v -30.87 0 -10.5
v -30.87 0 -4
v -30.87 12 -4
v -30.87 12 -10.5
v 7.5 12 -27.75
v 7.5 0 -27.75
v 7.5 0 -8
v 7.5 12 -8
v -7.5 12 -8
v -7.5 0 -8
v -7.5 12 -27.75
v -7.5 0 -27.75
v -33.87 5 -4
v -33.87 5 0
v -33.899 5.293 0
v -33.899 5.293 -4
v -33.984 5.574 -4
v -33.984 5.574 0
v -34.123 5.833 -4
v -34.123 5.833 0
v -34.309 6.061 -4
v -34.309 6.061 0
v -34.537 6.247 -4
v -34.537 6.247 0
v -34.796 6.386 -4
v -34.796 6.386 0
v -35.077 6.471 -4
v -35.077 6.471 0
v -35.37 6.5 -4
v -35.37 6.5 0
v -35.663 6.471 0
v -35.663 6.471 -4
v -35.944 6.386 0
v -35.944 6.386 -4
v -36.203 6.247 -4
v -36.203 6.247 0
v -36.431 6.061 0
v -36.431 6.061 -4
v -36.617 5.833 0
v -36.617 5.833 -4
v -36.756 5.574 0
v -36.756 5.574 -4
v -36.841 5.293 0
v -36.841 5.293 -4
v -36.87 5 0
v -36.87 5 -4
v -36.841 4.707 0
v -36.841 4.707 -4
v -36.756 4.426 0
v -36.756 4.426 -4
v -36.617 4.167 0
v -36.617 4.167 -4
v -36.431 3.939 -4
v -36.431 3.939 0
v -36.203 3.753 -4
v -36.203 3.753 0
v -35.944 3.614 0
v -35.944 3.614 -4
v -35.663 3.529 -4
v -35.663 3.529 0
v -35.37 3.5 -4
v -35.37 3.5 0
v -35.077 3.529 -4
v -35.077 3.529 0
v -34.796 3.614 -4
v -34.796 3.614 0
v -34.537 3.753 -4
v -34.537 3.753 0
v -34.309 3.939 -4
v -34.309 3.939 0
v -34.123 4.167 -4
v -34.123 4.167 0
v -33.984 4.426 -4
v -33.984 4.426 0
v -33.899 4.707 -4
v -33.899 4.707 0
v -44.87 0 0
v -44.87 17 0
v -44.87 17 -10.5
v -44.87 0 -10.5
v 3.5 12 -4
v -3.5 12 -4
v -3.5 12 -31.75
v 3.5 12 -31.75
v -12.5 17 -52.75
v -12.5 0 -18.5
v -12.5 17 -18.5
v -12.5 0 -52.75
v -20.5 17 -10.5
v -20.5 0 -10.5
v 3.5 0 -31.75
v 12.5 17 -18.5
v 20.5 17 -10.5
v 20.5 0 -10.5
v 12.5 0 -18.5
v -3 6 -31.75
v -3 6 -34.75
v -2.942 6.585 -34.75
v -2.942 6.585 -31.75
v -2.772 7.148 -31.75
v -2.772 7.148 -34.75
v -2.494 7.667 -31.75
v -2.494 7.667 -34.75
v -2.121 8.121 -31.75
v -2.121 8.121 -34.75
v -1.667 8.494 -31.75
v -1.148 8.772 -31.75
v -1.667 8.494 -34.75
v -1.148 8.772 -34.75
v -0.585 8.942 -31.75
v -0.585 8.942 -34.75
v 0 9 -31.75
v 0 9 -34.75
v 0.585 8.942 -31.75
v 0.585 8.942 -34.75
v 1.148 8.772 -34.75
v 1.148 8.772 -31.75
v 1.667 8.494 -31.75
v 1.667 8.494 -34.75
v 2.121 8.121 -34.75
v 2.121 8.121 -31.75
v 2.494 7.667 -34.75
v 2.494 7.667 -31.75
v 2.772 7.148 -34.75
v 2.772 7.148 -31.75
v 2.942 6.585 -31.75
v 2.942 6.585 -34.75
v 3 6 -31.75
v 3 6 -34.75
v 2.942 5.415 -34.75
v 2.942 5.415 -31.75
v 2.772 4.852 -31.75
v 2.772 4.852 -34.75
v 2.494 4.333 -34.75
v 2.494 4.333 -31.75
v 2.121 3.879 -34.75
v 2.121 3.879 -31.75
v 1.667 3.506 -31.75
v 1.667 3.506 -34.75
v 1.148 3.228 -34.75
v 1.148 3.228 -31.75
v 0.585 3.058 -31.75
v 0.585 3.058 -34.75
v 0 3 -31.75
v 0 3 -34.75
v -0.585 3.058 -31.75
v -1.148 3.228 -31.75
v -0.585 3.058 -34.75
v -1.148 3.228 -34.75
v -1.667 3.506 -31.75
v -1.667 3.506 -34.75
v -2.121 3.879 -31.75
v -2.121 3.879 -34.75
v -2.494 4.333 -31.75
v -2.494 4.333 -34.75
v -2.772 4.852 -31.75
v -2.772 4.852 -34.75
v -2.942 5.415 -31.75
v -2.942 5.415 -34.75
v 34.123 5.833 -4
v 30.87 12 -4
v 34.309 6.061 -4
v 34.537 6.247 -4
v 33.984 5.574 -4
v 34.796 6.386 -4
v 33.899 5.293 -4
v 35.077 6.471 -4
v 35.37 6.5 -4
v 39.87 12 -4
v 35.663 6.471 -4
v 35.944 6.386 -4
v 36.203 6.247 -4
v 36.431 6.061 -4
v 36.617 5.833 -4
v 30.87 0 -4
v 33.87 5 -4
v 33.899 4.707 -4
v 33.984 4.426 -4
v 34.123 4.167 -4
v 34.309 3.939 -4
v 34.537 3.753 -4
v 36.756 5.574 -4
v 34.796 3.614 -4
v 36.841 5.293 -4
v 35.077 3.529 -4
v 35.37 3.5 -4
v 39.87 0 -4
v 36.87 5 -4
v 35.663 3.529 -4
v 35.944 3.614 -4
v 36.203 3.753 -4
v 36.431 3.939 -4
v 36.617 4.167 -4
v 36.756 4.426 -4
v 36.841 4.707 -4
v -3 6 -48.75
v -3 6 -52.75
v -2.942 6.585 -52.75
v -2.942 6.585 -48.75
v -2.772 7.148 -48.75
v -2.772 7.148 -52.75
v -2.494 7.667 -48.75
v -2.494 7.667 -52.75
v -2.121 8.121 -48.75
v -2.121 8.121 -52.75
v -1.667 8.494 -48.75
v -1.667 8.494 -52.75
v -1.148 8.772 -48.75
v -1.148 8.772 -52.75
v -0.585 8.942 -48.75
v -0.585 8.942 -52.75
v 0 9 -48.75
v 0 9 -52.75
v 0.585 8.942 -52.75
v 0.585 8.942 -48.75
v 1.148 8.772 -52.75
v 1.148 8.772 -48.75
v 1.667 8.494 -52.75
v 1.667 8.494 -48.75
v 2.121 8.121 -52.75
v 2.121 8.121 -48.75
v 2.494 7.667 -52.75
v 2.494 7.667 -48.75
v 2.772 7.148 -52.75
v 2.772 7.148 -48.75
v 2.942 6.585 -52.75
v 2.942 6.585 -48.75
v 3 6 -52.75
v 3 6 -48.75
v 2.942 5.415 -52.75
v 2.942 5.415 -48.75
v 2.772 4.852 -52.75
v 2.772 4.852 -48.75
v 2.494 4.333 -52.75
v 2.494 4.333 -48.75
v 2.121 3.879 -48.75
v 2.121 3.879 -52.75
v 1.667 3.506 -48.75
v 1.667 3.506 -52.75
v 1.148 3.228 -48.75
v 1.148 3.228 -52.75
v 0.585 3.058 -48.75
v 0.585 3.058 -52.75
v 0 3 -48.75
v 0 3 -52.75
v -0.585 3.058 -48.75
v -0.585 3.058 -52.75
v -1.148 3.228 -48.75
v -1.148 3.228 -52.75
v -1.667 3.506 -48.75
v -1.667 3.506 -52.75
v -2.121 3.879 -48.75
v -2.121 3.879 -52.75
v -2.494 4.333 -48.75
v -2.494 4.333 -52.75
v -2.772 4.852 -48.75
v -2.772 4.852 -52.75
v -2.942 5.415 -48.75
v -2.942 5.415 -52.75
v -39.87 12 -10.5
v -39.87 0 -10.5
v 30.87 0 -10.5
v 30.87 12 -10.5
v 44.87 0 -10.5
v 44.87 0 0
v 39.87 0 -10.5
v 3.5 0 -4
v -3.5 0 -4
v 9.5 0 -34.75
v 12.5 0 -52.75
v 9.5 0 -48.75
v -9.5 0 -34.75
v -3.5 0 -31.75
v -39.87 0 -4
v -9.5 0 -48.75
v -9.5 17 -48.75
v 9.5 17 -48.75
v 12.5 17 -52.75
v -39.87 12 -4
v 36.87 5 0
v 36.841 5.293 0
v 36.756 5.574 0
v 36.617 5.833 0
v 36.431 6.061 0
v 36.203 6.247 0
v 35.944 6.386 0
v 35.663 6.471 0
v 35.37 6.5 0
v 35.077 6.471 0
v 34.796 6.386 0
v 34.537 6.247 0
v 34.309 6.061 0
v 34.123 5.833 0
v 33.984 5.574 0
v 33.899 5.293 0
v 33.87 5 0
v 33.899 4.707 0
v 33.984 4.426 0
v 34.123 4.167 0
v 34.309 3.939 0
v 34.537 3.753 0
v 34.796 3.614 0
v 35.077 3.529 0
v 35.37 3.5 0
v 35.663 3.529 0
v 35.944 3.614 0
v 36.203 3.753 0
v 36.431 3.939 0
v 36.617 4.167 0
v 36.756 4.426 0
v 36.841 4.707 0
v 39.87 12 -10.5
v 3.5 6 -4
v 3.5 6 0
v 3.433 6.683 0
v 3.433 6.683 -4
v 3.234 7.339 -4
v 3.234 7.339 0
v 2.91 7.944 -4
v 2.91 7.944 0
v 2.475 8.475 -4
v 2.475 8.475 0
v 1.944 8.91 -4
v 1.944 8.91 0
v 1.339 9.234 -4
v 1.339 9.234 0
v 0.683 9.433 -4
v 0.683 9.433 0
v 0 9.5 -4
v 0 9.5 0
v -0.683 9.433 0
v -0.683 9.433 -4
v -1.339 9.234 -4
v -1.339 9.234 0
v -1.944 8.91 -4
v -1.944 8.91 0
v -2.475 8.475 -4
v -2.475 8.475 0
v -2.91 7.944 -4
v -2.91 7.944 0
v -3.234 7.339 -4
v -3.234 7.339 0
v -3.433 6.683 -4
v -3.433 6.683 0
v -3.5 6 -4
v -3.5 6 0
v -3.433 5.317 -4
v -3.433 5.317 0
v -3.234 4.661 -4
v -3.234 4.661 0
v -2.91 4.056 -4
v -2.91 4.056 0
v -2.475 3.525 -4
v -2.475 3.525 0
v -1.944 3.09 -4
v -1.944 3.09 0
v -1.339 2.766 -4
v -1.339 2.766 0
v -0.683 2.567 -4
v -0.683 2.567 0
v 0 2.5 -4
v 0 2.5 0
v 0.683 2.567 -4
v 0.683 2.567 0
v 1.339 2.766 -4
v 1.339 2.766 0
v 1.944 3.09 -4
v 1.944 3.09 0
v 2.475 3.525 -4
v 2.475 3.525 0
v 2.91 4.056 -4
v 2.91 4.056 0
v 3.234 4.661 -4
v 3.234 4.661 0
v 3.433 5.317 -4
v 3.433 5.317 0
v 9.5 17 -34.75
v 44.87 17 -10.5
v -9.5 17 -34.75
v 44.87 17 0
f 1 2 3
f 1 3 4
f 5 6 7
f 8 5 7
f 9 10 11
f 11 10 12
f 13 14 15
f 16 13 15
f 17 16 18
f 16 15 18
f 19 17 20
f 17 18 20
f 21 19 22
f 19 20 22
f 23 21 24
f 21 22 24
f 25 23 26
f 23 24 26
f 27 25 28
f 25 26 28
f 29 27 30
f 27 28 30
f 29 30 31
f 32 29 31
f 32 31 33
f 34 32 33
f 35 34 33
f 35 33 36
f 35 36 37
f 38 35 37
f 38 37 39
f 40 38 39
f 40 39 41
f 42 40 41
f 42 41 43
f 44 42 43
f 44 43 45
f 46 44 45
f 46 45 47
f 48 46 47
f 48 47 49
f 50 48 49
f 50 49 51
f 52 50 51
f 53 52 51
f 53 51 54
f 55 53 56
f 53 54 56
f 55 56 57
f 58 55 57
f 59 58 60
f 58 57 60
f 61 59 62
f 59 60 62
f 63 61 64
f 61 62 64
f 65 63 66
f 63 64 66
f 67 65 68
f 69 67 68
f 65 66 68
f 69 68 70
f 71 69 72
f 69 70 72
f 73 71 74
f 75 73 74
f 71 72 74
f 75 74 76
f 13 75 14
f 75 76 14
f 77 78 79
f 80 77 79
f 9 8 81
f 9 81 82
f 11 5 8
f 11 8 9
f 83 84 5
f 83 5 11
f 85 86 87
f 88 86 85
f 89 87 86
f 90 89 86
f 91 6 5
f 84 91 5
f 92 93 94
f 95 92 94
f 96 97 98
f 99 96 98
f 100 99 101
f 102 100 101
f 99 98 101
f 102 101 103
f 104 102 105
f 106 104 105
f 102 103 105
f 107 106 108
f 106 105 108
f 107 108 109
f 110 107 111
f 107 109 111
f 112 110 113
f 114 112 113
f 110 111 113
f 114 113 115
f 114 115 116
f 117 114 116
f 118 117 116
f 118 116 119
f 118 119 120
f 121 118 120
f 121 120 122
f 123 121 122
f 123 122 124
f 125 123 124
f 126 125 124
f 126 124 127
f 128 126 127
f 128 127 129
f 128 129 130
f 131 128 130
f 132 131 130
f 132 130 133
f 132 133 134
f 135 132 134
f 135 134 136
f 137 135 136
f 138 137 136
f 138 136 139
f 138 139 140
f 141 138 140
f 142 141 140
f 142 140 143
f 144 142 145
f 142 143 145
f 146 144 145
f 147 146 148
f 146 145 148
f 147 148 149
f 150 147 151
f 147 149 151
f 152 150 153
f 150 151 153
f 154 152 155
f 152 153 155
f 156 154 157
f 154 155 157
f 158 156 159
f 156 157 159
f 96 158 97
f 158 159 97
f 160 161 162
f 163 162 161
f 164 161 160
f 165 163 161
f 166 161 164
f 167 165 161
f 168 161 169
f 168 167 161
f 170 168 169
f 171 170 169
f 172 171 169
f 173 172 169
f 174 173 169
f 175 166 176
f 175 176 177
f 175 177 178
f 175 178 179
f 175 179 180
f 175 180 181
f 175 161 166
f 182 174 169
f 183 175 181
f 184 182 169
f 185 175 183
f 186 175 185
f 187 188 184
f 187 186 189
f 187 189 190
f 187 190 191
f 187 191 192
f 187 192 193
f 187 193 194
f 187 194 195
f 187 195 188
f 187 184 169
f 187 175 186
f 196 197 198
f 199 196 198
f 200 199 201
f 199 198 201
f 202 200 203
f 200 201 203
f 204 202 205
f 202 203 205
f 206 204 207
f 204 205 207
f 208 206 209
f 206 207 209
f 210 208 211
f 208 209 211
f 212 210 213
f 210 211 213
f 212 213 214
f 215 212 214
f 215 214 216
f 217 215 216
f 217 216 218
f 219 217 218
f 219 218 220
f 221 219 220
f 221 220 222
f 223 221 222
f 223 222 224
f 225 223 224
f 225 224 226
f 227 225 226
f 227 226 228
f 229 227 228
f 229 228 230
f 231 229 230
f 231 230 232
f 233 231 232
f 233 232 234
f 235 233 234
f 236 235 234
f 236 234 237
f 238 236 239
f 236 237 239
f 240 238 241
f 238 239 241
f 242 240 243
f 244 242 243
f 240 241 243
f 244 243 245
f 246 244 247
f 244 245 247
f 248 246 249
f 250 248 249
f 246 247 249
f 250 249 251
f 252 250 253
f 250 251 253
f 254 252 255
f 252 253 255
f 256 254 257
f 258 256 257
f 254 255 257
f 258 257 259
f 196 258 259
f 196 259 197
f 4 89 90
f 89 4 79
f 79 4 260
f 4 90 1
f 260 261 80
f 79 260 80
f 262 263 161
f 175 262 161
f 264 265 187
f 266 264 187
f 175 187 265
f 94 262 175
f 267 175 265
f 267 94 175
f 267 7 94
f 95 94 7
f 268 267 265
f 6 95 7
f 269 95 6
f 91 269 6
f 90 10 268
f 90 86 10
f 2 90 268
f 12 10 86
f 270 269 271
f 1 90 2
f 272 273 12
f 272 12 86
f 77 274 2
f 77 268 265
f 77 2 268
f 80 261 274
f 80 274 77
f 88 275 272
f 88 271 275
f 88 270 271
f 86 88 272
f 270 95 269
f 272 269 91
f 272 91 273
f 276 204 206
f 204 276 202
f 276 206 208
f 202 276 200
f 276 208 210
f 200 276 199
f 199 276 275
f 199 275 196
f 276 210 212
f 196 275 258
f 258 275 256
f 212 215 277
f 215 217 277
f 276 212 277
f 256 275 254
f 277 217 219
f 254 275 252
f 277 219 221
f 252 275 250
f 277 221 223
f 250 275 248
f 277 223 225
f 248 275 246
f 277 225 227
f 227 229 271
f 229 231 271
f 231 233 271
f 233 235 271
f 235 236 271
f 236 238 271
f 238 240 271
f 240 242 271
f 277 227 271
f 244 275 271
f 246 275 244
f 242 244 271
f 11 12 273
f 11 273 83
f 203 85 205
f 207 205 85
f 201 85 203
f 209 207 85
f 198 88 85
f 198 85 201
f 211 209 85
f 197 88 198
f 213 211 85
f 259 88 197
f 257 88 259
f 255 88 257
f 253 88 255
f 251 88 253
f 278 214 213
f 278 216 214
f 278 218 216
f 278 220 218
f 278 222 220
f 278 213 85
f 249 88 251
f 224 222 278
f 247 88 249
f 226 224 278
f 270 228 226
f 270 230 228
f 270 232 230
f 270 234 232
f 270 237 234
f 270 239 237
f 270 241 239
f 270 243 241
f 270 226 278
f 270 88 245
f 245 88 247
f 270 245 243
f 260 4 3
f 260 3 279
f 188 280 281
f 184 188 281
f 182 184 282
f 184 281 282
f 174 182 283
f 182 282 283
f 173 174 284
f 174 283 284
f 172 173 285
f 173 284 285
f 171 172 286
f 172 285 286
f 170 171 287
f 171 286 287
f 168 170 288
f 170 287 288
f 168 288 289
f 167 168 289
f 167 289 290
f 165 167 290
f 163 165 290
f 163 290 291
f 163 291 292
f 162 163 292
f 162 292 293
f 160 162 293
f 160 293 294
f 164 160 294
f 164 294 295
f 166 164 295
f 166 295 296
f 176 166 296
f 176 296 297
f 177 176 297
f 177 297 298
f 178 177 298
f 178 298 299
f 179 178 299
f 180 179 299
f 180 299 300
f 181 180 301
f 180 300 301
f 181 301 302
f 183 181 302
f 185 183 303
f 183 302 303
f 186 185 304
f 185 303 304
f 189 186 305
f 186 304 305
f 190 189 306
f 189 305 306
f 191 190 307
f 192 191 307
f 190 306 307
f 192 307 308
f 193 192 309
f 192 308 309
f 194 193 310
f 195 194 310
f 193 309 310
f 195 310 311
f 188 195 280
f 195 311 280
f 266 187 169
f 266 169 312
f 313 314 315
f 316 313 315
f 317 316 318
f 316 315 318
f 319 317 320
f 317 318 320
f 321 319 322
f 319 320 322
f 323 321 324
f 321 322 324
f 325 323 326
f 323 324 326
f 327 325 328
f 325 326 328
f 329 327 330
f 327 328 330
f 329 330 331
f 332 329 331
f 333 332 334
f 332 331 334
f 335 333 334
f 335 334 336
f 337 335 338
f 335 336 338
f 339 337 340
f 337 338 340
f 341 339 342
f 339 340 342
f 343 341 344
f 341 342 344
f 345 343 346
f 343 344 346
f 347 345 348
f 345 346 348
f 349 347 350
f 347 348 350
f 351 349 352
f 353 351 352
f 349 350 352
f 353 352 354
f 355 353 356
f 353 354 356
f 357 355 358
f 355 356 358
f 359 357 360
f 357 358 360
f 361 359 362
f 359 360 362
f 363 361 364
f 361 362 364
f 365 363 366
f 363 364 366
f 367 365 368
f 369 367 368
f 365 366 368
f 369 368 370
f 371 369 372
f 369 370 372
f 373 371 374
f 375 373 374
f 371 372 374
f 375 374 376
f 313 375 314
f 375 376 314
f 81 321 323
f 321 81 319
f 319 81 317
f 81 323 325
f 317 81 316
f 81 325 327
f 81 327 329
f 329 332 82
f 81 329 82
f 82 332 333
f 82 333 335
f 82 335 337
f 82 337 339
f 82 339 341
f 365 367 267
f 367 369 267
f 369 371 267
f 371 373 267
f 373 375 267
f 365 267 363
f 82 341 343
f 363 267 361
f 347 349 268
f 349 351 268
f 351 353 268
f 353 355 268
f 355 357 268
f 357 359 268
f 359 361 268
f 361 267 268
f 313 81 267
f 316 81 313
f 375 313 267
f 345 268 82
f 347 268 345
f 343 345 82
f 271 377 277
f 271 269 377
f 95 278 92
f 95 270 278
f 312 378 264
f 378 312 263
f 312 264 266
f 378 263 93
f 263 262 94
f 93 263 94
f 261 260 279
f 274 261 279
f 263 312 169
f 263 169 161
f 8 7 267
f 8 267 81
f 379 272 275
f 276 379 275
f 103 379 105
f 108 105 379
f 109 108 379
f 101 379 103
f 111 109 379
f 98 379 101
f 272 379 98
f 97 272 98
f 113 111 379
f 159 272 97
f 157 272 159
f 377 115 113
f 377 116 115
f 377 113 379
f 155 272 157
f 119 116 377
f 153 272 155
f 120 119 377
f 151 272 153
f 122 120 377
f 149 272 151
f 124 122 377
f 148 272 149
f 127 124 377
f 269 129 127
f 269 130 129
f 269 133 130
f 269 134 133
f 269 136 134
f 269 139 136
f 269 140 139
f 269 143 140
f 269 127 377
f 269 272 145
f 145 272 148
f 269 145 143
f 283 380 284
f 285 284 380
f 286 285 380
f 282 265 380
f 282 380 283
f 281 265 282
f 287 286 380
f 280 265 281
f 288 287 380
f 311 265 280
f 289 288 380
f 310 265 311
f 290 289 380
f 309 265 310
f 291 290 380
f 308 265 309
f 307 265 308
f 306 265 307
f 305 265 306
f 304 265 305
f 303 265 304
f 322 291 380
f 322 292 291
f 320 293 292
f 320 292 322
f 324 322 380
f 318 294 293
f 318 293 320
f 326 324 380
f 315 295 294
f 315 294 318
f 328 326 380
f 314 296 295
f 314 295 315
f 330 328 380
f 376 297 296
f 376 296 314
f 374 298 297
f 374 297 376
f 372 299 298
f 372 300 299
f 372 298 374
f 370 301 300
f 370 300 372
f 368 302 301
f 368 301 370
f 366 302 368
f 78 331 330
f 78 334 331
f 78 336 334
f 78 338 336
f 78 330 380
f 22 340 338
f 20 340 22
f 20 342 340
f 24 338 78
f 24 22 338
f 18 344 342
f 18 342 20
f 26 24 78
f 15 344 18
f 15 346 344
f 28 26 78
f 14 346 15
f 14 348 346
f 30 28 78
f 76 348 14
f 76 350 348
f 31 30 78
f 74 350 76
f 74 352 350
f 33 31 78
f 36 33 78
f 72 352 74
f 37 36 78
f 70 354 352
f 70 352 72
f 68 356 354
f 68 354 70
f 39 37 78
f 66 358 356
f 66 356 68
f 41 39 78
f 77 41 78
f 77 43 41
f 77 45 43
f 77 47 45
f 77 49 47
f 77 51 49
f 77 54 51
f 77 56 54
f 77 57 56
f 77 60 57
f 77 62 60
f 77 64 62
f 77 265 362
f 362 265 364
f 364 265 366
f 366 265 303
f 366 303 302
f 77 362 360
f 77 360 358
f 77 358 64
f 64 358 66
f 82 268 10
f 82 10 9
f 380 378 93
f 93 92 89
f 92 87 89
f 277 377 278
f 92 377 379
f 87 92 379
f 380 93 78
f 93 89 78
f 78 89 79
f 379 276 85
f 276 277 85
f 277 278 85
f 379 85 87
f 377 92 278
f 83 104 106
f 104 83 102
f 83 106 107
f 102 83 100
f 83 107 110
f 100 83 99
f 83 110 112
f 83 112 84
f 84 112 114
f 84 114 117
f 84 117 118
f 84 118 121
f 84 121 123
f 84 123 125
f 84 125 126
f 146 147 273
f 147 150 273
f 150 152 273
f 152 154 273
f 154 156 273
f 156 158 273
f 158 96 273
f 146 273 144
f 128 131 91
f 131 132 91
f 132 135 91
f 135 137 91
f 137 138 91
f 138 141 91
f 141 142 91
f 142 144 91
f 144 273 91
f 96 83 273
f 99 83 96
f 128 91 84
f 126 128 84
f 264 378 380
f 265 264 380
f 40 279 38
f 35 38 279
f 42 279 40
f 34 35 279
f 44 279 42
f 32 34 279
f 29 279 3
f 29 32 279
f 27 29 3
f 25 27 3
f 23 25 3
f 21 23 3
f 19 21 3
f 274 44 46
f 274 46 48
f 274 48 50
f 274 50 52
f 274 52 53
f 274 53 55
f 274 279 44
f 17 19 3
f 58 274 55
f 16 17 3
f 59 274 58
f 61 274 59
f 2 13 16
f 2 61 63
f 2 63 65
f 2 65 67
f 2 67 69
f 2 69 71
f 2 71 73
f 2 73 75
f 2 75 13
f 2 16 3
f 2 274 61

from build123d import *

# Parameters (mm, degrees)
SKETCH_1_W          = 19
SKETCH_1_H          = 14
EXTRUDE_1_DEPTH     = 12
CUT_EXTRUDE_2_REACH = 72.284
SKETCH_4_R          = 1.5
SKETCH_5_W          = 19
SKETCH_5_H          = 14
EXTRUDE_2_DEPTH     = 5
CUT_EXTRUDE_4_REACH = 73.308
SKETCH_6_R          = 3
SKETCH_7_R          = 3.5
CUT_EXTRUDE_5_DEPTH = 4
CHAMFER_1_SIZE      = 4
CHAMFER_2_SIZE      = 8


with BuildPart() as part:
    # 草图1 → 凸台-拉伸1 (new body)
    with BuildSketch(Plane(origin=(0, 0, 0), x_dir=(1, 0, 0), z_dir=(0, 1, 0))):
        Polygon((-30.87, 10.5), (-12.5, 10.5), (-12.5, 52.75), (12.5, 52.75), (12.5, 10.5), (30.87, 10.5), (30.87, 4), (39.87, 4), (39.87, 10.5), (44.87, 10.5), (44.87, 0), (-44.87, 0), (-44.87, 10.5), (-39.87, 10.5), (-39.87, 4), (-30.87, 4), align=None)
        with Locations((0, 41.75)):
            Rectangle(SKETCH_1_W, SKETCH_1_H, mode=Mode.SUBTRACT)
        Polygon((-7.5, 31.75), (7.5, 31.75), (7.5, 7.5), (7.5, 4), (-7.5, 4), (-7.5, 7.5), align=None, mode=Mode.SUBTRACT)
    extrude(amount=EXTRUDE_1_DEPTH)

    # 草图4 → 切除-拉伸2 (cut, up to next)
    with BuildSketch(Plane.XY, mode=Mode.PRIVATE) as cut_extrude_2_sk1:
        with Locations((-35.37, 5)):
            Circle(SKETCH_4_R)
    cut_extrude_2_tool1 = extrude(cut_extrude_2_sk1.sketch, amount=-CUT_EXTRUDE_2_REACH, mode=Mode.PRIVATE) & part.part
    # 草图4 → 切除-拉伸2 (cut, up to next)
    with BuildSketch(Plane.XY, mode=Mode.PRIVATE) as cut_extrude_2_sk2:
        with Locations((35.37, 5)):
            Circle(SKETCH_4_R)
    cut_extrude_2_tool2 = extrude(cut_extrude_2_sk2.sketch, amount=-CUT_EXTRUDE_2_REACH, mode=Mode.PRIVATE) & part.part
    add(cut_extrude_2_tool1.solids().sort_by_distance((-35.37, 5, 0))[0], mode=Mode.SUBTRACT)
    add(cut_extrude_2_tool2.solids().sort_by_distance((35.37, 5, 0))[0], mode=Mode.SUBTRACT)

    # 草图5 → 凸台-拉伸2 (add)
    with BuildSketch(Plane(origin=(0, 12, 0), x_dir=(1, 0, 0), z_dir=(0, 1, 0))):
        Polygon((-39.87, 10.5), (-30.87, 10.5), (-12.5, 10.5), (-12.5, 52.75), (12.5, 52.75), (12.5, 10.5), (30.87, 10.5), (39.87, 10.5), (44.87, 10.5), (44.87, 0), (-44.87, 0), (-44.87, 10.5), align=None)
        with Locations((0, 41.75)):
            Rectangle(SKETCH_5_W, SKETCH_5_H, mode=Mode.SUBTRACT)
    extrude(amount=EXTRUDE_2_DEPTH)

    # 切除-拉伸4: up to this face of the body (flat: up to its plane)
    cut_extrude_4_end = Plane(part.part.faces().sort_by_distance((0, 6, -31.75))[0])
    # 草图6 → 切除-拉伸4 (cut, up to the picked face)
    with BuildSketch(Plane(origin=(0, 0, -52.75), x_dir=(-1, 0, 0), z_dir=(0, 0, -1)), mode=Mode.PRIVATE) as cut_extrude_4_sk1:
        with Locations((0, 6)):
            Circle(SKETCH_6_R)
    cut_extrude_4_tool1 = split(extrude(cut_extrude_4_sk1.sketch, amount=-CUT_EXTRUDE_4_REACH, mode=Mode.PRIVATE), bisect_by=cut_extrude_4_end, keep=Keep.BOTH, mode=Mode.PRIVATE)
    add(cut_extrude_4_tool1.solids().sort_by(Axis((0, 6, -52.75), (0, 0, 1)))[0], mode=Mode.SUBTRACT)

    # 草图7 → 切除-拉伸5 (cut)
    with BuildSketch(Plane.XY):
        with Locations((0, 6)):
            Circle(SKETCH_7_R)
    extrude(amount=-CUT_EXTRUDE_5_DEPTH, mode=Mode.SUBTRACT)

    # 倒角1
    chamfer_1_edges = [part.edges().sort_by_distance(p)[0] for p in [
        (-7.5, 6, -4),
        (7.5, 6, -4),
        (7.5, 6, -31.75),
        (-7.5, 6, -31.75),
    ]]
    chamfer(chamfer_1_edges, length=CHAMFER_1_SIZE - 0.0001)  # a hair under: the kernel refuses the full size

    # 倒角2
    chamfer_2_edges = [part.edges().sort_by_distance(p)[0] for p in [
        (-12.5, 8.5, -10.5),
        (12.5, 8.5, -10.5),
    ]]
    chamfer(chamfer_2_edges, length=CHAMFER_2_SIZE)


solid = part.part
